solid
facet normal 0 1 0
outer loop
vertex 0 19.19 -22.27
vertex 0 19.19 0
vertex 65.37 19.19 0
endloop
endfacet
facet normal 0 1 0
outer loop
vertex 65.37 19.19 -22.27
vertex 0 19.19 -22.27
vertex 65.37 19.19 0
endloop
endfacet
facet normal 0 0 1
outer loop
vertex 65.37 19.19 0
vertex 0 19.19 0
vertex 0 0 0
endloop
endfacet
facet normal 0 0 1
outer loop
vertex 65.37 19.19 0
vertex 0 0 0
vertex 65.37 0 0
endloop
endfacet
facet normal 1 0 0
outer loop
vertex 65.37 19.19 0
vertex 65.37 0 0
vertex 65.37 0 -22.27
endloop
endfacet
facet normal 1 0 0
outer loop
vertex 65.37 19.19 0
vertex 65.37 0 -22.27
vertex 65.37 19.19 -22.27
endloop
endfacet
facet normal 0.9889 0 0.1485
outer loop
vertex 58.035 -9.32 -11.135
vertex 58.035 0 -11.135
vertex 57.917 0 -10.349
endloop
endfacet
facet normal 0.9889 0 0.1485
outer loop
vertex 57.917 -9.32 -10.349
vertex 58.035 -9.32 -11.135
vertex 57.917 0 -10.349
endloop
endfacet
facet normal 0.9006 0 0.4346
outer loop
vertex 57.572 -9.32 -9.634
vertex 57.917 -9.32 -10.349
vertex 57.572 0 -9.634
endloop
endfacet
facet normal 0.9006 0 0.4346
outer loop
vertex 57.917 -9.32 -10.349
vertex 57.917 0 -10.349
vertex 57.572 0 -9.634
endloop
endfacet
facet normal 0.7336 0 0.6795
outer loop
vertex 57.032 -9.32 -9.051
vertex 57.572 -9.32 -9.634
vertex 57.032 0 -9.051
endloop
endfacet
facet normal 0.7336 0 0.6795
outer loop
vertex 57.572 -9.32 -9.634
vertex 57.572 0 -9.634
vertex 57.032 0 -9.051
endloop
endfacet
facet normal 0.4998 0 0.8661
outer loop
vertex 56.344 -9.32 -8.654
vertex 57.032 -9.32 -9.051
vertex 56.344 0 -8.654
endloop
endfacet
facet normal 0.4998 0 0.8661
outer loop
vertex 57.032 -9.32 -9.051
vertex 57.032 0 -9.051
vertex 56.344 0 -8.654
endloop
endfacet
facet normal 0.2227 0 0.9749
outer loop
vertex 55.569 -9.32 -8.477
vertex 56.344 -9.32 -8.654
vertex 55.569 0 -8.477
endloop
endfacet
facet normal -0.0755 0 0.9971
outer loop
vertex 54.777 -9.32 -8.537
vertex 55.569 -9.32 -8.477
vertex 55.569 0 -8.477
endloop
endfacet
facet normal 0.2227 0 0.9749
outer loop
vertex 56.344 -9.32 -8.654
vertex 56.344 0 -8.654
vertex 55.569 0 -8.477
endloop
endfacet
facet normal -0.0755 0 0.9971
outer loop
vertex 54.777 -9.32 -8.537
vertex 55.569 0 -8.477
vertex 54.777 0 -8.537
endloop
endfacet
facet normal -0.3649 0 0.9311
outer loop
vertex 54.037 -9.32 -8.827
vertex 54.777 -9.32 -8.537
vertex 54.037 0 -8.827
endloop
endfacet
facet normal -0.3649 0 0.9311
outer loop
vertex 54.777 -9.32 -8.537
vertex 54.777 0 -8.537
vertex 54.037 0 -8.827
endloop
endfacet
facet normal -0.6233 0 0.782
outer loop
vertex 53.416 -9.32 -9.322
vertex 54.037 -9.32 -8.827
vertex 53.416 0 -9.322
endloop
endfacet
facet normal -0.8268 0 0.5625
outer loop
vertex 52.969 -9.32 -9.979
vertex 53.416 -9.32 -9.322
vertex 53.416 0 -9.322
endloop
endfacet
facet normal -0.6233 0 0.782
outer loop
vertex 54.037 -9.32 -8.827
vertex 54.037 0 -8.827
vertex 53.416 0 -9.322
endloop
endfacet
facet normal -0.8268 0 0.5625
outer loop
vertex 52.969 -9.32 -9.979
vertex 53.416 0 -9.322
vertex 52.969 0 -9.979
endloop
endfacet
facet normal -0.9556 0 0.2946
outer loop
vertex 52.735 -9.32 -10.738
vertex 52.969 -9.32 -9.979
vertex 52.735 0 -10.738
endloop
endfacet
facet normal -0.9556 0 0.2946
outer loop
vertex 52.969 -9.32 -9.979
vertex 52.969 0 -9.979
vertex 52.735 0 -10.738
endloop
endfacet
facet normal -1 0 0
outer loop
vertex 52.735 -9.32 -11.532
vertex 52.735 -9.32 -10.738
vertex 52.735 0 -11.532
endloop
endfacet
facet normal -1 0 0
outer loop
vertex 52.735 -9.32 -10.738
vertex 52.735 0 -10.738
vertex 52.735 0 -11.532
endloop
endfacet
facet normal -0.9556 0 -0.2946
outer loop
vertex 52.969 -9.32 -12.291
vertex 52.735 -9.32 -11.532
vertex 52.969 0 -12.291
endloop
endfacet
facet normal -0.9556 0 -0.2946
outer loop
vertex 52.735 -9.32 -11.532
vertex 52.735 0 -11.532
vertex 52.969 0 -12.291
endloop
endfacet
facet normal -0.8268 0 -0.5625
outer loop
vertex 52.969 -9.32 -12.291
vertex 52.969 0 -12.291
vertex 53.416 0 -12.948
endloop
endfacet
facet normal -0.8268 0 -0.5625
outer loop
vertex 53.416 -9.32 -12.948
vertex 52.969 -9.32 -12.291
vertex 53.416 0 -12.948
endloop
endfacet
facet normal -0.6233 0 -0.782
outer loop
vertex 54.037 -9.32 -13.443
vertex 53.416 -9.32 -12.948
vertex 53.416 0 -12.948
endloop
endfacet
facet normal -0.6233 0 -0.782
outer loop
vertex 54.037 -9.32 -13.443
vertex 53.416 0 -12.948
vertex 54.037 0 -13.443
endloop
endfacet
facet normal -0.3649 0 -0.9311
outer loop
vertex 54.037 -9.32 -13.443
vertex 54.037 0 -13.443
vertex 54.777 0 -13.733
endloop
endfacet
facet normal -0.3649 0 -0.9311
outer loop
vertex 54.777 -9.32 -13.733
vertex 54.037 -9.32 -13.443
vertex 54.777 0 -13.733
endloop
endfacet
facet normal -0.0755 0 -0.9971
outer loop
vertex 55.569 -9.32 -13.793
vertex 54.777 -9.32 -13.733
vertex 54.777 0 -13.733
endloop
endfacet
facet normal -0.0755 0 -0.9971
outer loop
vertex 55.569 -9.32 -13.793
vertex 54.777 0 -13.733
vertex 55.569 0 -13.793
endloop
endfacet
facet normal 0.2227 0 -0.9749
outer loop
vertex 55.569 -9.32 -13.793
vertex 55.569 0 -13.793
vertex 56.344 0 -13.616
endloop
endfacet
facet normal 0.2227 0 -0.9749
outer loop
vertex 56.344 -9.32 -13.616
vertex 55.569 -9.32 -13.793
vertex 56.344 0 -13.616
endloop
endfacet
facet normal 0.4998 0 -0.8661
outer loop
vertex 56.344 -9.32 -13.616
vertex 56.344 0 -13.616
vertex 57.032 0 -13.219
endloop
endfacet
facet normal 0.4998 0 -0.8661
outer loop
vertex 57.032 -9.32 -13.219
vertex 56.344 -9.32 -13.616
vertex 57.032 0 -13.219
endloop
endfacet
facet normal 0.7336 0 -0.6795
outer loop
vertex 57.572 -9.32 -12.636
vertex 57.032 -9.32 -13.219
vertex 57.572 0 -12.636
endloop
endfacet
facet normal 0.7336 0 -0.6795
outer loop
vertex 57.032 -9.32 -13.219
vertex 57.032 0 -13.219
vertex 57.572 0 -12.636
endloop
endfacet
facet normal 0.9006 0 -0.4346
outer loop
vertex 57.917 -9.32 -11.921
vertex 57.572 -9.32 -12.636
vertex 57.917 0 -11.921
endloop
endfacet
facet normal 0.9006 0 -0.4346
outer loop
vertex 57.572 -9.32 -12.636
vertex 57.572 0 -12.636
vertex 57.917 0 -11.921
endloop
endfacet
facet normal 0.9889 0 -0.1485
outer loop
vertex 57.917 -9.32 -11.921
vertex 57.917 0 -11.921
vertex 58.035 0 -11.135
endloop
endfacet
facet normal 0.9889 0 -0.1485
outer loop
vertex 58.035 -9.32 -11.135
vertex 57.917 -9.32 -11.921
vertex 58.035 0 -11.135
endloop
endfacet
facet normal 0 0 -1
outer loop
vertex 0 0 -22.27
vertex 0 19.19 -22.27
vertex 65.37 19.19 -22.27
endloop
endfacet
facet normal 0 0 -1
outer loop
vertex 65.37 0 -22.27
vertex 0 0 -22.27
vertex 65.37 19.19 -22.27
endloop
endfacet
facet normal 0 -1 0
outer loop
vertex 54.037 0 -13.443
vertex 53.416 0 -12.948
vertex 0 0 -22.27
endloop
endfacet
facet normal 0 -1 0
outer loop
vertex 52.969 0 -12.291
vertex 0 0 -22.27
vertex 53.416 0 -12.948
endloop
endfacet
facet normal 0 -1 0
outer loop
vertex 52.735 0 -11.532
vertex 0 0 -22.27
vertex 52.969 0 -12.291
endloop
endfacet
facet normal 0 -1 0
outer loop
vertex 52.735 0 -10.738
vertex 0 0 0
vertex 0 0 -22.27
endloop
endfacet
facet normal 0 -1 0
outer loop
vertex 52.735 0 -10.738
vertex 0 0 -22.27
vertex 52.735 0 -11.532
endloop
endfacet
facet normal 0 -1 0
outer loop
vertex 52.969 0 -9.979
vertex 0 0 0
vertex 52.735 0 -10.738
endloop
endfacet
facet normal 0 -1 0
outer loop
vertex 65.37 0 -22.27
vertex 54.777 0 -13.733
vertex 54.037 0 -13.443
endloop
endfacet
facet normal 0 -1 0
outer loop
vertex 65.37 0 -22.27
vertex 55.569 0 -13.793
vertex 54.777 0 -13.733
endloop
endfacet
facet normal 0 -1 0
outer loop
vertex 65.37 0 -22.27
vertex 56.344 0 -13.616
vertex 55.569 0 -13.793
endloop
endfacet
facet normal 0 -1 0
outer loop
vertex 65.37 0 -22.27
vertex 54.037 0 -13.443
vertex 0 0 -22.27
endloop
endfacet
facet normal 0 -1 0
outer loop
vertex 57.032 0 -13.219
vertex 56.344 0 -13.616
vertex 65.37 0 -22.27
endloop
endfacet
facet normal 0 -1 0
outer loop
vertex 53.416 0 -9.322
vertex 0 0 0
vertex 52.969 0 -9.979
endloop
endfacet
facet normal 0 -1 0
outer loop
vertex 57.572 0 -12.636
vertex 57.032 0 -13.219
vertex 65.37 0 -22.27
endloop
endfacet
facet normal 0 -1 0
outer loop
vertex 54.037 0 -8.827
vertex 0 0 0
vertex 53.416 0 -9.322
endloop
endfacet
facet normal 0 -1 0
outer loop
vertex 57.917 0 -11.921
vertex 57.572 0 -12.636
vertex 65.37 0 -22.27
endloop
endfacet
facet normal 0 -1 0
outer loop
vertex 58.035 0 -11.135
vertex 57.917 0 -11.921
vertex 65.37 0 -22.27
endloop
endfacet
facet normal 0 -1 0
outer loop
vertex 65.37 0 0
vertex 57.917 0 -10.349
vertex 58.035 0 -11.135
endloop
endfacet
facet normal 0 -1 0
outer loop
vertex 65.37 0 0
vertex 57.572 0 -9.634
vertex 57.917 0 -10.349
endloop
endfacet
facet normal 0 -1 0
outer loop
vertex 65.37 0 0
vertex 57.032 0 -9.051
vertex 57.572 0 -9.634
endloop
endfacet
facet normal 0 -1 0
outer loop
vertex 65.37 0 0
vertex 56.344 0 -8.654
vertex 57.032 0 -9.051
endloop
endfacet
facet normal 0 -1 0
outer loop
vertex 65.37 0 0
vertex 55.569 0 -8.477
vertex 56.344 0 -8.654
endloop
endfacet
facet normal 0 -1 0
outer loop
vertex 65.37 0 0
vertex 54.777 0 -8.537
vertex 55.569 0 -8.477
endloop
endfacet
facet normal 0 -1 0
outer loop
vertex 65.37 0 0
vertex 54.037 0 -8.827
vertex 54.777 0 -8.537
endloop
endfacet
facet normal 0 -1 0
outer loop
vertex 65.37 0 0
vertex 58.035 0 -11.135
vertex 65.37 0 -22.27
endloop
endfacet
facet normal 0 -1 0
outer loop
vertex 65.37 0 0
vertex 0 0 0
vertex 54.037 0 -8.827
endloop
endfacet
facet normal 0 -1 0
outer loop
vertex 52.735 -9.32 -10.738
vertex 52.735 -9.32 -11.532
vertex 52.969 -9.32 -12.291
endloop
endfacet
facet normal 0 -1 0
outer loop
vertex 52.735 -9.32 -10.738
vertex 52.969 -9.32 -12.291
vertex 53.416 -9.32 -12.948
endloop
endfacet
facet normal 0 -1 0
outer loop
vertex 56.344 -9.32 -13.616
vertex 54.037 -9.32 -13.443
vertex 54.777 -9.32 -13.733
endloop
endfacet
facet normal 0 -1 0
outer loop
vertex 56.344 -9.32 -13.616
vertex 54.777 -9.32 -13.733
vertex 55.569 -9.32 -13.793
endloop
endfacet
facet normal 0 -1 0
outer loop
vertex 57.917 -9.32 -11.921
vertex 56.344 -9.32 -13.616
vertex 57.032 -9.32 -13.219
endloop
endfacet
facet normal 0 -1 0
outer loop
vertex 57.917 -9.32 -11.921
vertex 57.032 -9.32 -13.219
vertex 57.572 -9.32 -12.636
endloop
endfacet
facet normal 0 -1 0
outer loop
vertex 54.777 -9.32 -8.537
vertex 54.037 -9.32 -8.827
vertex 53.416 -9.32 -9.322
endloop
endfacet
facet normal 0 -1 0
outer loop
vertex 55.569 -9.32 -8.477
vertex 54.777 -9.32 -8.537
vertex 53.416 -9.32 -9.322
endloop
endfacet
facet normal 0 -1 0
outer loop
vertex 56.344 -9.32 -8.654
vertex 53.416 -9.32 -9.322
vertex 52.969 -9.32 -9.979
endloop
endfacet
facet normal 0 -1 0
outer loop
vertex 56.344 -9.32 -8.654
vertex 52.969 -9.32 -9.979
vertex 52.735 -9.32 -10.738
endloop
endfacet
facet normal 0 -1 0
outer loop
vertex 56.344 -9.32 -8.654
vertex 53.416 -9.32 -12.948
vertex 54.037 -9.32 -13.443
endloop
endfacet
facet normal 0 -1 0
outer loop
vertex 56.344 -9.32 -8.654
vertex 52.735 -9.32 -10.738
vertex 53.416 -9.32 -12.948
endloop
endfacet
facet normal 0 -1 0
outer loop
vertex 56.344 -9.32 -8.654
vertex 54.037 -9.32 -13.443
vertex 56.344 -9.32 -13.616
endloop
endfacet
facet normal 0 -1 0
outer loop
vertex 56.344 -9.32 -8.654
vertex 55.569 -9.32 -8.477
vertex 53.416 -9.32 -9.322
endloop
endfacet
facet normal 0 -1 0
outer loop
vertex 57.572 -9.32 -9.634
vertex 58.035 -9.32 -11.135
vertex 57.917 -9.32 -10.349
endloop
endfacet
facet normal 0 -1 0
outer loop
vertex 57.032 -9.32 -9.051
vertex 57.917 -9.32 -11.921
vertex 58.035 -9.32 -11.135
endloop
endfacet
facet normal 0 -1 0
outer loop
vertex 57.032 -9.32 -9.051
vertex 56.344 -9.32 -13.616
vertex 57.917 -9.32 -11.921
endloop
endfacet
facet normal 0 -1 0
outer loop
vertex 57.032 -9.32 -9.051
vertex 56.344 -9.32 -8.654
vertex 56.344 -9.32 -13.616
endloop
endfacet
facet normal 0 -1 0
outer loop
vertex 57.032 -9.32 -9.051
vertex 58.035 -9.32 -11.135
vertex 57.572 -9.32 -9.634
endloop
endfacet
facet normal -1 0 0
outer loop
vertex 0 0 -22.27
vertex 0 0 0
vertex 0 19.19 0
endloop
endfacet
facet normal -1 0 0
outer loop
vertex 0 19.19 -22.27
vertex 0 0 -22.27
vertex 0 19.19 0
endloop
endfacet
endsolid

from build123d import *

# Parameters (mm, degrees)
SKETCH1_W           = 65.37
SKETCH1_H           = 19.19
BOSS_EXTRUDE1_DEPTH = 22.27
SKETCH2_R           = 2.665
BOSS_EXTRUDE2_DEPTH = 9.32


with BuildPart() as part:
    # Sketch1 → Boss-Extrude1 (new body)
    with BuildSketch(Plane.XY):
        with Locations((32.685, 9.595)):
            Rectangle(SKETCH1_W, SKETCH1_H)
    extrude(amount=-BOSS_EXTRUDE1_DEPTH)

    # Sketch2 → Boss-Extrude2 (add)
    with BuildSketch(Plane.XZ):
        with Locations((55.37, -11.135)):
            Circle(SKETCH2_R)
    extrude(amount=BOSS_EXTRUDE2_DEPTH)


solid = part.part
